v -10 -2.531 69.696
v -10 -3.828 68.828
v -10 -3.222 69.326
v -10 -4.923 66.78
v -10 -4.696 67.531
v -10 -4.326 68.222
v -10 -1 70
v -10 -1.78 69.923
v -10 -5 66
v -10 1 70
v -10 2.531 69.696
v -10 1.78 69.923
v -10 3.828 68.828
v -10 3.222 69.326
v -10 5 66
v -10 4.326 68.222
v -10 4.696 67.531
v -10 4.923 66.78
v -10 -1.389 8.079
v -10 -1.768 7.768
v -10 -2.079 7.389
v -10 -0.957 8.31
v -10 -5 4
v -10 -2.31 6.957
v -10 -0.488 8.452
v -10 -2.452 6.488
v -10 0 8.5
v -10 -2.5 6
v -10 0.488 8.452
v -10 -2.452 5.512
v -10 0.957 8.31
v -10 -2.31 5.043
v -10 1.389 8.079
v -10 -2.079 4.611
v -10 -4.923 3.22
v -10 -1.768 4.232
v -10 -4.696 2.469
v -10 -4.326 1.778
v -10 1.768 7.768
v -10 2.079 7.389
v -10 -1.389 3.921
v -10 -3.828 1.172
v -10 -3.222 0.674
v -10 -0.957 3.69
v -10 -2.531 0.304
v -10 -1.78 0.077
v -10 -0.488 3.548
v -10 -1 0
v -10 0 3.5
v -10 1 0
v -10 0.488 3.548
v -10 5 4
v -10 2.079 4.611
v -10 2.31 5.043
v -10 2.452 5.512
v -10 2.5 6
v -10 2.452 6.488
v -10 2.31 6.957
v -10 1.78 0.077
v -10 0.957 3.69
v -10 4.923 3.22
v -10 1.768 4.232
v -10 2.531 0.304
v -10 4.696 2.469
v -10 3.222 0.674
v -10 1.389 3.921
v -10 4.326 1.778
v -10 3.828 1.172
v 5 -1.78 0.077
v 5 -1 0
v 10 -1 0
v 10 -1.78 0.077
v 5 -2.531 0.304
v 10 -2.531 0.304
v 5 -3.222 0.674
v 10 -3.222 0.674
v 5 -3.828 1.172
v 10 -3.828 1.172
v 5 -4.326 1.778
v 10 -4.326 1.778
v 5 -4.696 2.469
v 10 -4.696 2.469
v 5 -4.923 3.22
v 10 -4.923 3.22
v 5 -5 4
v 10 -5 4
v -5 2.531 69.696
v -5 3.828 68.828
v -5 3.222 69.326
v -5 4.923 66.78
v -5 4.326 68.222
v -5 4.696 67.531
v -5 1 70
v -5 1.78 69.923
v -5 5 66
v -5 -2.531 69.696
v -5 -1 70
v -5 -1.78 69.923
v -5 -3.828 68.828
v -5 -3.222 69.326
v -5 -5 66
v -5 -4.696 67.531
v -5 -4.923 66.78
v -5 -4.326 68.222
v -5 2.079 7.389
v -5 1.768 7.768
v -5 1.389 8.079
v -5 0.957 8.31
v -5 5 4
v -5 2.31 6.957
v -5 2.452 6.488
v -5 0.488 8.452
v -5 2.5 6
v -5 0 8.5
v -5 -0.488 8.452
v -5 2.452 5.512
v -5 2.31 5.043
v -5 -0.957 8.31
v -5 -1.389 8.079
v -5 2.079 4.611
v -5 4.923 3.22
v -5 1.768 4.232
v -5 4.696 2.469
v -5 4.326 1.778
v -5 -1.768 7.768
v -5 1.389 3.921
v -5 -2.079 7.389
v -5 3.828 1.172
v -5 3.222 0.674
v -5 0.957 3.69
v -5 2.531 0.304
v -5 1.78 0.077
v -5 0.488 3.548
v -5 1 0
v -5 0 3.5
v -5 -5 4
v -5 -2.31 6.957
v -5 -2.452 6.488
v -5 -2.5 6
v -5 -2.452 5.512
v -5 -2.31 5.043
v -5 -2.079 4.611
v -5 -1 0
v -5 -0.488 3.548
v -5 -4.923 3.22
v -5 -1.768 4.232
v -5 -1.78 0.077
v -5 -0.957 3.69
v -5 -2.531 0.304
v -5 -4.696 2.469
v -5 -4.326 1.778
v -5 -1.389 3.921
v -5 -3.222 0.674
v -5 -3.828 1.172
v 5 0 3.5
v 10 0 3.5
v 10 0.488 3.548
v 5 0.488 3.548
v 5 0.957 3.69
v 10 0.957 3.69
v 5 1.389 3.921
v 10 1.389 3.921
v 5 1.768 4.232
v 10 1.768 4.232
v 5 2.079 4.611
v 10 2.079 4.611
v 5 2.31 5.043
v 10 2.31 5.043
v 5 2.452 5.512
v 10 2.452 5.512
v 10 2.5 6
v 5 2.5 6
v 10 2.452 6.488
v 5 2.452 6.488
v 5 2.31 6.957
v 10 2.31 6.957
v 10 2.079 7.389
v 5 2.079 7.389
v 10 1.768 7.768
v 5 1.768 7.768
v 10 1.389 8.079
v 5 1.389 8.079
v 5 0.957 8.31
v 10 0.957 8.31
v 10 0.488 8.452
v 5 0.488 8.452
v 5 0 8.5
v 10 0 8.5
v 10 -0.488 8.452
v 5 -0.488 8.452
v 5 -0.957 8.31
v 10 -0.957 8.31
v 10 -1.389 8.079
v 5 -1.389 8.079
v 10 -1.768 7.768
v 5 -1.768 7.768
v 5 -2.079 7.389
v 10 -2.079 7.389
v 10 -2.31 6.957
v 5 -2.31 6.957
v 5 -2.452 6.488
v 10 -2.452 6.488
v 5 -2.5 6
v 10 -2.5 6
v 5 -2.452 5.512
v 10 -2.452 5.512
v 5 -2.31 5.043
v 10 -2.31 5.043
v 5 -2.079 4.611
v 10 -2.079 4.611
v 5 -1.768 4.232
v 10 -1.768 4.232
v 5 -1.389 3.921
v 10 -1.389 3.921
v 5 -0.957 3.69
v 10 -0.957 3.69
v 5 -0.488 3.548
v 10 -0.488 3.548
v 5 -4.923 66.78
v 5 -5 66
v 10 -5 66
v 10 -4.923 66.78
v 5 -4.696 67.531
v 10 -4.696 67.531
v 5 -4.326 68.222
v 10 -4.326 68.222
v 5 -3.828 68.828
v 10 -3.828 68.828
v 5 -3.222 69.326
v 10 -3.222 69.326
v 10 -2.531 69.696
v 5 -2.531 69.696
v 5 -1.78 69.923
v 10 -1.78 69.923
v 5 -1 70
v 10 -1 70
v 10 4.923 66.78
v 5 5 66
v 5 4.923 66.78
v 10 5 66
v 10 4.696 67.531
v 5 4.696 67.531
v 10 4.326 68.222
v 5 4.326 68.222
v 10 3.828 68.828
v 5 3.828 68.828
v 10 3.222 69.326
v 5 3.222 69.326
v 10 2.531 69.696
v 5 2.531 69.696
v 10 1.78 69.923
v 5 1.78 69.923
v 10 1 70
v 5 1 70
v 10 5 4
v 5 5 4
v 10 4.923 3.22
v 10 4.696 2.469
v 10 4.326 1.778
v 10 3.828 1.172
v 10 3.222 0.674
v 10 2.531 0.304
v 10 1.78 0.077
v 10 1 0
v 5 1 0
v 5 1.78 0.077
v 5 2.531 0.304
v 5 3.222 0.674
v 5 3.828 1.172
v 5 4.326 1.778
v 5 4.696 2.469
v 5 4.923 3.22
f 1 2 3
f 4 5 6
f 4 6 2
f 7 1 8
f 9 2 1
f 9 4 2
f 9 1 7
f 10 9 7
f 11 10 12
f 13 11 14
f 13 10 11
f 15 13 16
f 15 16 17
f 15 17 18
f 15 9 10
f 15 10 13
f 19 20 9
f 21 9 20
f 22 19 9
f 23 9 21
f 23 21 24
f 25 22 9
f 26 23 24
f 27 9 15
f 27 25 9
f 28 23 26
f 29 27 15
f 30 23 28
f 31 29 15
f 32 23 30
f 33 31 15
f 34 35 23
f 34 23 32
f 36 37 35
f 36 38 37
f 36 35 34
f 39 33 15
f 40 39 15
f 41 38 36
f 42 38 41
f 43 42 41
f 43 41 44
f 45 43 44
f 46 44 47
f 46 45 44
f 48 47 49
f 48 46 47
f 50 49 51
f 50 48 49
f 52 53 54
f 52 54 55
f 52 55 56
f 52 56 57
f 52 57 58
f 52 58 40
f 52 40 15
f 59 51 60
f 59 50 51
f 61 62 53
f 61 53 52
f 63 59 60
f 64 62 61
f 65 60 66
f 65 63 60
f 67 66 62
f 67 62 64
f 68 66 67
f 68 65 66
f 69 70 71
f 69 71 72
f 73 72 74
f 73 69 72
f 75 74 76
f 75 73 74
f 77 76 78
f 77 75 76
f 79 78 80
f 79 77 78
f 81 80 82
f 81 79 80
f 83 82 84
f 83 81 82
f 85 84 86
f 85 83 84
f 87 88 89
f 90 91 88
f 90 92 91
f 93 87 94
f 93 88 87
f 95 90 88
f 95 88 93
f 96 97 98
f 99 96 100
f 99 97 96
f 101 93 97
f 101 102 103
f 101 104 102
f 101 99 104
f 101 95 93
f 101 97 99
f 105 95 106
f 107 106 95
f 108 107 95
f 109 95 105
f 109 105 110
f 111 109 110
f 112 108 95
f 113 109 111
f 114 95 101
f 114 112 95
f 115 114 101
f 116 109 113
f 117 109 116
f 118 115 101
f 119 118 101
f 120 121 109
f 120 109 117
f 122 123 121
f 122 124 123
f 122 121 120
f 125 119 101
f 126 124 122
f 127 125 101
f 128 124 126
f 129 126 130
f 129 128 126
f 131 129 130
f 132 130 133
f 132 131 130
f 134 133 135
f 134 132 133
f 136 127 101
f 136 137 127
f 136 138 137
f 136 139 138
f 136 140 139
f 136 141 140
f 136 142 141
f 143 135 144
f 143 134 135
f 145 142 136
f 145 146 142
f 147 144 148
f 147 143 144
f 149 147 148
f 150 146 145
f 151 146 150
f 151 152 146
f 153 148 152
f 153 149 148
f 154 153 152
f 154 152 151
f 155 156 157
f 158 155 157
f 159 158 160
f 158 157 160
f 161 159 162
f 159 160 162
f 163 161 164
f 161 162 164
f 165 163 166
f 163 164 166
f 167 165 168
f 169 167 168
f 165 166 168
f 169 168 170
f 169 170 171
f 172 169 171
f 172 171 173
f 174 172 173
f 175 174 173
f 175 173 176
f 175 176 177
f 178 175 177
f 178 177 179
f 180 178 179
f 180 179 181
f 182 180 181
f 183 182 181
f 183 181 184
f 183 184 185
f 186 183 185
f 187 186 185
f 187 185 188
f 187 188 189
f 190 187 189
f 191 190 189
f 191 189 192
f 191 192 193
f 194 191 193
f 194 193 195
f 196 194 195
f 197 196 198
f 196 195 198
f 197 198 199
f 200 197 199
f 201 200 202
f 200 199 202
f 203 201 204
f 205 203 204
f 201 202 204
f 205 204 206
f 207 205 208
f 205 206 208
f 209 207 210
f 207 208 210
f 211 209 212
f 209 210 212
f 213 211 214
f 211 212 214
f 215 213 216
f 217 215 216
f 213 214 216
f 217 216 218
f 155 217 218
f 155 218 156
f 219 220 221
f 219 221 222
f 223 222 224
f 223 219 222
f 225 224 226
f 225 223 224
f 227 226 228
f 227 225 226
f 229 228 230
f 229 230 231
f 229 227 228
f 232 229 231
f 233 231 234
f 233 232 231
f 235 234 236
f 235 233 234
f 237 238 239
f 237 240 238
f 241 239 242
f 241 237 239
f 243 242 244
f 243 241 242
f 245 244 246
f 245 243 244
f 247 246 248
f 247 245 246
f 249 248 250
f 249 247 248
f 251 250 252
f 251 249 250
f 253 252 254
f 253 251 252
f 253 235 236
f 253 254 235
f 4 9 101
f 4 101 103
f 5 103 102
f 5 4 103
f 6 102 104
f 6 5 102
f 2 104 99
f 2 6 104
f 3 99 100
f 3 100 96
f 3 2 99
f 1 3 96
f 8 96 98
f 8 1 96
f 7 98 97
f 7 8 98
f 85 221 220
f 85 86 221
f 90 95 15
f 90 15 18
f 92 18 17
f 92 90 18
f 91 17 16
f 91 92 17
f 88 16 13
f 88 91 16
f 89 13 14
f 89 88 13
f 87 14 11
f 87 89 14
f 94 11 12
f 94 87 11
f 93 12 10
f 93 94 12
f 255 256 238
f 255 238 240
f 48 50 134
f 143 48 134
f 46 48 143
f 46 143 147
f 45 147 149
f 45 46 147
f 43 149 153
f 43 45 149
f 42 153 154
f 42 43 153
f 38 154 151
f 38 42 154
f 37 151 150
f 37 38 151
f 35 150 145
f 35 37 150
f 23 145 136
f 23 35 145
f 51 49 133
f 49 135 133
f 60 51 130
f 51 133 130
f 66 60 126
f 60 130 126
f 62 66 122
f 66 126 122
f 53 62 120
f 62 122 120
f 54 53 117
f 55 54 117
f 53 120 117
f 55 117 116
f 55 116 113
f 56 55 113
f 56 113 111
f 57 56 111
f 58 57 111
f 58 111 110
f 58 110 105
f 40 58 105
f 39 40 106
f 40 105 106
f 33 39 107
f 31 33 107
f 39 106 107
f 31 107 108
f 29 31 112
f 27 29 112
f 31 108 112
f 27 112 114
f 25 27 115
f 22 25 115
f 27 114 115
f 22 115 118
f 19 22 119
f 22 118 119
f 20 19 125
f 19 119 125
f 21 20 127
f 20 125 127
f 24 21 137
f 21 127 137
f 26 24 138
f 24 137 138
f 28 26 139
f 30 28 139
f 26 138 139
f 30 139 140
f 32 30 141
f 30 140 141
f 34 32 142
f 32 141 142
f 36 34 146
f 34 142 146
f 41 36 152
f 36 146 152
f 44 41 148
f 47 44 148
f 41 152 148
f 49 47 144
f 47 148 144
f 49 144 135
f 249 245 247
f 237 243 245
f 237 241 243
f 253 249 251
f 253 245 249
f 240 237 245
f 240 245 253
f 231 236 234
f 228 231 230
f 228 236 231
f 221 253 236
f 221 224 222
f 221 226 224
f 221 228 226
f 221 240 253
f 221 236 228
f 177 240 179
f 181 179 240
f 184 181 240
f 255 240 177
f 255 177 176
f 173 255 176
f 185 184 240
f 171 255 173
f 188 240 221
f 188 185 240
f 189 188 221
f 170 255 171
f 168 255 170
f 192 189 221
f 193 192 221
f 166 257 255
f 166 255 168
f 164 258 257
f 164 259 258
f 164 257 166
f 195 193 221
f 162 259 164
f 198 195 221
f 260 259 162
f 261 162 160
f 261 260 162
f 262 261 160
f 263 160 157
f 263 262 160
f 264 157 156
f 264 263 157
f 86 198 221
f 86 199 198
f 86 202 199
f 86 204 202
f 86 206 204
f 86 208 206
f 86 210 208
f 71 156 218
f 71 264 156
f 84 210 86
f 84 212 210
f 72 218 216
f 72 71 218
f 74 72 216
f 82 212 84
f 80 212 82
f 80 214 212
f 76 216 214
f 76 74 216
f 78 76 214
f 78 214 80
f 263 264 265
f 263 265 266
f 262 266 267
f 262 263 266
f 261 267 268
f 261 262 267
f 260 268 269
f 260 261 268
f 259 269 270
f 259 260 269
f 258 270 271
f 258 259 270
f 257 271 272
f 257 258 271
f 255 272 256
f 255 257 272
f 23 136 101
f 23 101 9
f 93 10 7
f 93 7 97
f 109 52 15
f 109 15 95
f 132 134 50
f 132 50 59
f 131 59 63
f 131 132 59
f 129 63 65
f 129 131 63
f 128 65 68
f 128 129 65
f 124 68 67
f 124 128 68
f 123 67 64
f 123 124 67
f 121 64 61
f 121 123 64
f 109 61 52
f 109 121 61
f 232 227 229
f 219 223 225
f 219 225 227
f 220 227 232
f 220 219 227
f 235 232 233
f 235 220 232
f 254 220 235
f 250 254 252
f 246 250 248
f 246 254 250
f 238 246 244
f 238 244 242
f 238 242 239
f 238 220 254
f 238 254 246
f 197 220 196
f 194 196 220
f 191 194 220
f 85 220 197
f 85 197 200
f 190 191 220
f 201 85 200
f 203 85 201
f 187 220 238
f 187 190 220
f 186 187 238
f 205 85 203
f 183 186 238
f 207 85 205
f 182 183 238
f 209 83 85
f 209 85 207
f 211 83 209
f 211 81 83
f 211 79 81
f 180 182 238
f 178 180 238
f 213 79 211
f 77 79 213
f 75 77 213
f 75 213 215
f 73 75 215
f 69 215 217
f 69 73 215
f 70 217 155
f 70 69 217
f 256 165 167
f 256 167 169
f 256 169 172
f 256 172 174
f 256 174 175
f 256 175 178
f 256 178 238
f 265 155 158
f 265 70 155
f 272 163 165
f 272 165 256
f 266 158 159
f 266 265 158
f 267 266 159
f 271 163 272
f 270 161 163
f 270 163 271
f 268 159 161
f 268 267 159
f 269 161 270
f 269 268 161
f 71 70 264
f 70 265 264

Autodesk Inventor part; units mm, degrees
ref_plane "YZ Plane" through (0, 0, 0) normal (1, 0, 0) x (0, 1, 0)
ref_plane "XZ Plane" through (0, 0, 0) normal (0, 1, 0) x (-1, 0, 0)
ref_plane "XY Plane" through (0, 0, 0) normal (0, 0, 1) x (1, 0, 0)
sketch "Sketch1" plane through (0, 0, 0) normal (0, 0, 1) x (1, 0, 0)
  line L0 (-5, 0) -> (5, 0) construction
  line L1 (-5, -5) -> (-10, -5)
  line L2 (-10, -5) -> (-10, 5)
  line L3 (-10, 5) -> (-5, 5)
  line L4 (-5, 5) -> (-5, -5)
  line L5 (10, -5) -> (5, -5)
  line L6 (5, -5) -> (5, 5)
  line L7 (5, 5) -> (10, 5)
  line L8 (10, 5) -> (10, -5)
  point P0 (0, 0)
  point P1 (0, 0)
  dimension "d0" = 10
  dimension "d1" = 5
  dimension "d2" = 5
  dimension "d3" = 10
  dimension "d4" = 10
extrude "Extrusion1" add sketch "Sketch1" along normal blind 70
fillet "Fillet1" radius 4 4 edges at (7.5, -5, 0) (7.5, 5, 0) (-7.5, -5, 0) (-7.5, 5, 0)
sketch "Sketch2" plane through (10, -5, 70) normal (1, 0, 0) x (0, 0, -1)
  circle A0 centre (64, 5) radius 2.5
  point P0 (70, 5)
  dimension "d8" = 5
  dimension "d9" = 6
extrude "Extrusion2" cut sketch "Sketch2" against normal up to surface (20 mm away)
fillet "Fillet2" radius 4 4 edges at (7.5, 5, 70) (7.5, -5, 70) (-7.5, 5, 70) (-7.5, -5, 70)
properties part number "manipulator first link"
